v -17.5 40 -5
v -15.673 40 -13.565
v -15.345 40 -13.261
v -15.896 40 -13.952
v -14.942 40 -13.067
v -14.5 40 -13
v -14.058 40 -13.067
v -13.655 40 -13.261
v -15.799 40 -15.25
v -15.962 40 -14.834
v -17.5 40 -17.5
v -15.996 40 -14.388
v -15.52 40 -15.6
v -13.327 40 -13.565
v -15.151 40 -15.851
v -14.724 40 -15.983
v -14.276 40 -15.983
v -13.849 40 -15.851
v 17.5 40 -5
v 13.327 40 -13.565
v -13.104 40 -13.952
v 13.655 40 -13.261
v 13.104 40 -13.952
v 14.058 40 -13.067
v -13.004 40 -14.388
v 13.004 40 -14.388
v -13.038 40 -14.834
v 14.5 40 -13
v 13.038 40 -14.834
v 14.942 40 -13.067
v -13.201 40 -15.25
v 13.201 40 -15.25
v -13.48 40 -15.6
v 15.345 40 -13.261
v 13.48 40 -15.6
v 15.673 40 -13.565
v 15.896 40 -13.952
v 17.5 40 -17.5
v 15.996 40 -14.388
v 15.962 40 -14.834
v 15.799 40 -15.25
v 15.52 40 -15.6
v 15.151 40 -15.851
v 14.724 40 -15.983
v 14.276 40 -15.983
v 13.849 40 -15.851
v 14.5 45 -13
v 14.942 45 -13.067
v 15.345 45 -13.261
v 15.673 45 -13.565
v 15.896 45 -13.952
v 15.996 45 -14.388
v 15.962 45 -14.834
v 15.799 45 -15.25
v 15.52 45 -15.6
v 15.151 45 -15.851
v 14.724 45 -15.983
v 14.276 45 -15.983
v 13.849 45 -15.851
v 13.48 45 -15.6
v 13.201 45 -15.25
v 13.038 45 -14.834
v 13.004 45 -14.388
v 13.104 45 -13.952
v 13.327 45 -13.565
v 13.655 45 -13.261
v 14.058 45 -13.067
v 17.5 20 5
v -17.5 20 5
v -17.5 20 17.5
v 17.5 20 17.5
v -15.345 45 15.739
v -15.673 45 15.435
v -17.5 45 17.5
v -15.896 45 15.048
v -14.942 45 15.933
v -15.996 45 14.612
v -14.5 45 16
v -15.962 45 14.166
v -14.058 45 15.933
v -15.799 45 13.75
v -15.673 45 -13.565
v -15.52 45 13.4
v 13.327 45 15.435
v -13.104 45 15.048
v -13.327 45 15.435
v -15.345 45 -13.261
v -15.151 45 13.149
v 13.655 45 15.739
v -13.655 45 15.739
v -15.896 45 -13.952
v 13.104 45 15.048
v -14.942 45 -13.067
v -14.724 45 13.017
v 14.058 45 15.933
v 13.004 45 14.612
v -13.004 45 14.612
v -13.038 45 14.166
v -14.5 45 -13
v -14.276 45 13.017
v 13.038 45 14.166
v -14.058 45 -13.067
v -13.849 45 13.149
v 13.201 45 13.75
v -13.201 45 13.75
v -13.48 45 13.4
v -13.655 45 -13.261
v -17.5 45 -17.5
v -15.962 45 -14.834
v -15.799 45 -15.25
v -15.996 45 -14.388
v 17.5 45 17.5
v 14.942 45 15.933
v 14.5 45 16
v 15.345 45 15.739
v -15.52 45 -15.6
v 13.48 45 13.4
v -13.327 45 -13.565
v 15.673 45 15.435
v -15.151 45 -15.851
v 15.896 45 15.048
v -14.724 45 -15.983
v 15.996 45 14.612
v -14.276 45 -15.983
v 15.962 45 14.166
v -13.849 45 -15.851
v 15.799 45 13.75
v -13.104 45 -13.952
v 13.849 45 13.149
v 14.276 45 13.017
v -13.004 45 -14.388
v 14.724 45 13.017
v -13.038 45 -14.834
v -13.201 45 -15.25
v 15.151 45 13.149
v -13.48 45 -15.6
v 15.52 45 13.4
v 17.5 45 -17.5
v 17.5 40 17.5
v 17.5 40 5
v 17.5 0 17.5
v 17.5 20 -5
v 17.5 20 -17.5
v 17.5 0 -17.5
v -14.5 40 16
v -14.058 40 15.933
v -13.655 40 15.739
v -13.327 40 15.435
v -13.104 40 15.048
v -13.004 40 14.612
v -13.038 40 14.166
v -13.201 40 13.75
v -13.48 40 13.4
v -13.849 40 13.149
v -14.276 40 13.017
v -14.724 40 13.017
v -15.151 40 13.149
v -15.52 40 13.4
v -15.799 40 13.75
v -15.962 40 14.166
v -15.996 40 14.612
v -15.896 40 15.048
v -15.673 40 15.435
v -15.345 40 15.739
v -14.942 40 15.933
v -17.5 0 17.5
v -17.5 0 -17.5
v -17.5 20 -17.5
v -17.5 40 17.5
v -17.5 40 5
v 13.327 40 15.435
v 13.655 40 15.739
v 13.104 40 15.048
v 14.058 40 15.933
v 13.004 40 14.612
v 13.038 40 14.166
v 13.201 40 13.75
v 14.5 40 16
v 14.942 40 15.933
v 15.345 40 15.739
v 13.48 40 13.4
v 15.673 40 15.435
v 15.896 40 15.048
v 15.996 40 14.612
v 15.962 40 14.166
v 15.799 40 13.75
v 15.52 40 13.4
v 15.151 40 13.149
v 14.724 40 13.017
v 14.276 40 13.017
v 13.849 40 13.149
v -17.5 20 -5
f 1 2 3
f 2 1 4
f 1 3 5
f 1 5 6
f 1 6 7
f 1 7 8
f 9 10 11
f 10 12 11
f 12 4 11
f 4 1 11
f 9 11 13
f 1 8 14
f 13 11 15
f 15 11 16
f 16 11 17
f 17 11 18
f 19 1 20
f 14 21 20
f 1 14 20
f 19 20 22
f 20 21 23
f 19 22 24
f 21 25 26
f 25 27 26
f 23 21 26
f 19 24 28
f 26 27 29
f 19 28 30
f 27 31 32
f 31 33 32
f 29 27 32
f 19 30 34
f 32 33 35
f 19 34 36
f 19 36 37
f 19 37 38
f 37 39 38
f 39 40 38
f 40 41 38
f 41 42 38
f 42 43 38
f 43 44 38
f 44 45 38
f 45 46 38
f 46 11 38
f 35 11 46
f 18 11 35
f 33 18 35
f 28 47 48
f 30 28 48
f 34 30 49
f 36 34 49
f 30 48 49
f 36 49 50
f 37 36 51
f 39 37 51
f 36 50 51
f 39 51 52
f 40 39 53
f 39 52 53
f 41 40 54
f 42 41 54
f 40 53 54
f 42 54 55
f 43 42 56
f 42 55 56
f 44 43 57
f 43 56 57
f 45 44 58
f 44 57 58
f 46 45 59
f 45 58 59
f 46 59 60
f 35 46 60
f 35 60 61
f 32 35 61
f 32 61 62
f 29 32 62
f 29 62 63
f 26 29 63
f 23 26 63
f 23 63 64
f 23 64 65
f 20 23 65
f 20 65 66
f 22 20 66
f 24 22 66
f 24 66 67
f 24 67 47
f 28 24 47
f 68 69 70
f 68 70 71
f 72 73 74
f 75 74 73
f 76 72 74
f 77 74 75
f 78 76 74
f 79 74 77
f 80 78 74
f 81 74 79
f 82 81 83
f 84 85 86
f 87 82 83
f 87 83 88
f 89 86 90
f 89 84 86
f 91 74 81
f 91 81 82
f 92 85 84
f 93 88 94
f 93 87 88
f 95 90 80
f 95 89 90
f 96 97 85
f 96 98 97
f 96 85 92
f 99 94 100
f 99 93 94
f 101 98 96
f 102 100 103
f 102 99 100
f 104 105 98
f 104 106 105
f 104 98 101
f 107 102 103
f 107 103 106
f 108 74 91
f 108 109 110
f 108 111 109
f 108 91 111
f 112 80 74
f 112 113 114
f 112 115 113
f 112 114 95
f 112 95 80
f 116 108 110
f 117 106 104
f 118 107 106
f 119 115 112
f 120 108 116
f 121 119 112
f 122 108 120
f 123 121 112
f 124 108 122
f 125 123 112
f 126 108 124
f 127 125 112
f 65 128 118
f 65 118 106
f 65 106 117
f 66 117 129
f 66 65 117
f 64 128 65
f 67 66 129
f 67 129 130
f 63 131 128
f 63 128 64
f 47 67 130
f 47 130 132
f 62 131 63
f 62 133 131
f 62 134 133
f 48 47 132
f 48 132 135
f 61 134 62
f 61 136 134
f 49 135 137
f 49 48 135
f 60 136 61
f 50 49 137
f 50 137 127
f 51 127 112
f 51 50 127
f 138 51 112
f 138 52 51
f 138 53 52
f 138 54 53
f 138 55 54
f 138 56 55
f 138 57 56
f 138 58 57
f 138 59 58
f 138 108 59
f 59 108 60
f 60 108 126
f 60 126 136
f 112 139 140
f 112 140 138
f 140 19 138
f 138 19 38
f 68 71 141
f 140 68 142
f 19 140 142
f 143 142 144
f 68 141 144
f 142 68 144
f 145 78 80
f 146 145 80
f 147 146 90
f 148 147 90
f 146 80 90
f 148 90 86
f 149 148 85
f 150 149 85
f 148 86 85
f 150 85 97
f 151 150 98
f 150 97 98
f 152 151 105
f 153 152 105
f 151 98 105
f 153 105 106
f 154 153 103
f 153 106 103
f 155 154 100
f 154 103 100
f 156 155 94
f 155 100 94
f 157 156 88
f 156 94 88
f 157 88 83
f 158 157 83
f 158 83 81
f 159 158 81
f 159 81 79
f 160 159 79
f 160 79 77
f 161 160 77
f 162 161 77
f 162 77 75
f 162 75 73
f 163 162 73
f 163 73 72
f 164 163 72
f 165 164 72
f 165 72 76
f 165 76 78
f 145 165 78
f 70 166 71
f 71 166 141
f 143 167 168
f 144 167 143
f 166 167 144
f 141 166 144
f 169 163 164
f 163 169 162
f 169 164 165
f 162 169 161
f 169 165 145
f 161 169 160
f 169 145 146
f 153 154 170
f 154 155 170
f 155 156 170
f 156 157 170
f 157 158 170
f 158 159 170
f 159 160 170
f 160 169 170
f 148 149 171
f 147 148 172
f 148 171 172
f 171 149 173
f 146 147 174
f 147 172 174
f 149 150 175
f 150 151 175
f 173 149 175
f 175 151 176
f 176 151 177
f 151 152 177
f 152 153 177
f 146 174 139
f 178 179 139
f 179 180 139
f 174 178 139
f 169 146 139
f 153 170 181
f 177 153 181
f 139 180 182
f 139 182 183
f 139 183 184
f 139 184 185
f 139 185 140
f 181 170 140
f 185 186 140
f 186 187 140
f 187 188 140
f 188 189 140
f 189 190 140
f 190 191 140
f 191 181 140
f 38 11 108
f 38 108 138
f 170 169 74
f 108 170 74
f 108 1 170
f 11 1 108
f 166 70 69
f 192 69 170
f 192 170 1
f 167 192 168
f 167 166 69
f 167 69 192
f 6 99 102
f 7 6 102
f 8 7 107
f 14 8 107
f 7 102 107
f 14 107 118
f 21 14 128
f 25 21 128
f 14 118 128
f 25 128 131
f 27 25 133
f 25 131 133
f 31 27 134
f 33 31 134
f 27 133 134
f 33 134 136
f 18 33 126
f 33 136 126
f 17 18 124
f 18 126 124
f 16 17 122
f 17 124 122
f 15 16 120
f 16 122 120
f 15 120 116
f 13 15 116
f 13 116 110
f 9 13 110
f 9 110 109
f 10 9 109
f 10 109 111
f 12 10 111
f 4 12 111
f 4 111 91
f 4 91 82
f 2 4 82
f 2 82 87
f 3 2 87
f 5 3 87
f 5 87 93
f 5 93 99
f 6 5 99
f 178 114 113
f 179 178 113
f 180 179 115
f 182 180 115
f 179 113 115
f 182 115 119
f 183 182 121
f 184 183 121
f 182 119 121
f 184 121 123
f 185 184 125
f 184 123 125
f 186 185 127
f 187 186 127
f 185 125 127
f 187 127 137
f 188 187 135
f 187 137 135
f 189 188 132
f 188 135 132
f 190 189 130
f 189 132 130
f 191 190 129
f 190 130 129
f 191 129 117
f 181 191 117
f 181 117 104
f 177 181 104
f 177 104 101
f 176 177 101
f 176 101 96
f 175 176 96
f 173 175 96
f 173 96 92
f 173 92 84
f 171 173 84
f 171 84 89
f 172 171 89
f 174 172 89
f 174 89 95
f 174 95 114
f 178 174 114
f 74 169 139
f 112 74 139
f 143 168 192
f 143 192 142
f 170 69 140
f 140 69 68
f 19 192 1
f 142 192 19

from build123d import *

# Parameters (mm, degrees)
SKETCH1_W           = 35
SKETCH1_H           = 35
BOSS_EXTRUDE2_DEPTH = 20
SKETCH2_W           = 35
SKETCH2_H           = 10
BOSS_EXTRUDE3_DEPTH = 20
SKETCH3_W           = 35
SKETCH3_H           = 35
BOSS_EXTRUDE4_DEPTH = 5
CUT_EXTRUDE1_REACH  = 53.357
SKETCH4_R           = 1.5


with BuildPart() as part:
    # Sketch1 → Boss-Extrude2 (new body)
    with BuildSketch(Plane(origin=(0, 0, 0), x_dir=(1, 0, 0), z_dir=(0, 1, 0))):
        Rectangle(SKETCH1_W, SKETCH1_H)
    extrude(amount=BOSS_EXTRUDE2_DEPTH)

    # Sketch2 → Boss-Extrude3 (add)
    with BuildSketch(Plane(origin=(0, 20, 0), x_dir=(1, 0, 0), z_dir=(0, 1, 0))):
        Rectangle(SKETCH2_W, SKETCH2_H)
    extrude(amount=BOSS_EXTRUDE3_DEPTH)

    # Sketch3 → Boss-Extrude4 (add)
    with BuildSketch(Plane(origin=(0, 40, 0), x_dir=(1, 0, 0), z_dir=(0, 1, 0))):
        Rectangle(SKETCH3_W, SKETCH3_H)
    extrude(amount=BOSS_EXTRUDE4_DEPTH)

    # Sketch4 → Cut-Extrude1 (cut, up to next)
    with BuildSketch(Plane(origin=(0, 45, 0), x_dir=(1, 0, 0), z_dir=(0, 1, 0)), mode=Mode.PRIVATE) as cut_extrude1_sk1:
        with Locations(Location((-14.5, 14.5, 0), (0, 0, 270))):
            Circle(SKETCH4_R)
    cut_extrude1_tool1 = extrude(cut_extrude1_sk1.sketch, amount=-CUT_EXTRUDE1_REACH, mode=Mode.PRIVATE) & part.part
    # Sketch4 → Cut-Extrude1 (cut, up to next)
    with BuildSketch(Plane(origin=(0, 45, 0), x_dir=(1, 0, 0), z_dir=(0, 1, 0)), mode=Mode.PRIVATE) as cut_extrude1_sk2:
        with Locations(Location((14.5, 14.5, 0), (0, 0, 270))):
            Circle(SKETCH4_R)
    cut_extrude1_tool2 = extrude(cut_extrude1_sk2.sketch, amount=-CUT_EXTRUDE1_REACH, mode=Mode.PRIVATE) & part.part
    # Sketch4 → Cut-Extrude1 (cut, up to next)
    with BuildSketch(Plane(origin=(0, 45, 0), x_dir=(1, 0, 0), z_dir=(0, 1, 0)), mode=Mode.PRIVATE) as cut_extrude1_sk3:
        with Locations(Location((14.5, -14.5, 0), (0, 0, 270))):
            Circle(SKETCH4_R)
    cut_extrude1_tool3 = extrude(cut_extrude1_sk3.sketch, amount=-CUT_EXTRUDE1_REACH, mode=Mode.PRIVATE) & part.part
    # Sketch4 → Cut-Extrude1 (cut, up to next)
    with BuildSketch(Plane(origin=(0, 45, 0), x_dir=(1, 0, 0), z_dir=(0, 1, 0)), mode=Mode.PRIVATE) as cut_extrude1_sk4:
        with Locations(Location((-14.5, -14.5, 0), (0, 0, 270))):
            Circle(SKETCH4_R)
    cut_extrude1_tool4 = extrude(cut_extrude1_sk4.sketch, amount=-CUT_EXTRUDE1_REACH, mode=Mode.PRIVATE) & part.part
    add(cut_extrude1_tool1.solids().sort_by_distance((-14.5, 45, -14.5))[0], mode=Mode.SUBTRACT)
    add(cut_extrude1_tool2.solids().sort_by_distance((14.5, 45, -14.5))[0], mode=Mode.SUBTRACT)
    add(cut_extrude1_tool3.solids().sort_by_distance((14.5, 45, 14.5))[0], mode=Mode.SUBTRACT)
    add(cut_extrude1_tool4.solids().sort_by_distance((-14.5, 45, 14.5))[0], mode=Mode.SUBTRACT)


solid = part.part
